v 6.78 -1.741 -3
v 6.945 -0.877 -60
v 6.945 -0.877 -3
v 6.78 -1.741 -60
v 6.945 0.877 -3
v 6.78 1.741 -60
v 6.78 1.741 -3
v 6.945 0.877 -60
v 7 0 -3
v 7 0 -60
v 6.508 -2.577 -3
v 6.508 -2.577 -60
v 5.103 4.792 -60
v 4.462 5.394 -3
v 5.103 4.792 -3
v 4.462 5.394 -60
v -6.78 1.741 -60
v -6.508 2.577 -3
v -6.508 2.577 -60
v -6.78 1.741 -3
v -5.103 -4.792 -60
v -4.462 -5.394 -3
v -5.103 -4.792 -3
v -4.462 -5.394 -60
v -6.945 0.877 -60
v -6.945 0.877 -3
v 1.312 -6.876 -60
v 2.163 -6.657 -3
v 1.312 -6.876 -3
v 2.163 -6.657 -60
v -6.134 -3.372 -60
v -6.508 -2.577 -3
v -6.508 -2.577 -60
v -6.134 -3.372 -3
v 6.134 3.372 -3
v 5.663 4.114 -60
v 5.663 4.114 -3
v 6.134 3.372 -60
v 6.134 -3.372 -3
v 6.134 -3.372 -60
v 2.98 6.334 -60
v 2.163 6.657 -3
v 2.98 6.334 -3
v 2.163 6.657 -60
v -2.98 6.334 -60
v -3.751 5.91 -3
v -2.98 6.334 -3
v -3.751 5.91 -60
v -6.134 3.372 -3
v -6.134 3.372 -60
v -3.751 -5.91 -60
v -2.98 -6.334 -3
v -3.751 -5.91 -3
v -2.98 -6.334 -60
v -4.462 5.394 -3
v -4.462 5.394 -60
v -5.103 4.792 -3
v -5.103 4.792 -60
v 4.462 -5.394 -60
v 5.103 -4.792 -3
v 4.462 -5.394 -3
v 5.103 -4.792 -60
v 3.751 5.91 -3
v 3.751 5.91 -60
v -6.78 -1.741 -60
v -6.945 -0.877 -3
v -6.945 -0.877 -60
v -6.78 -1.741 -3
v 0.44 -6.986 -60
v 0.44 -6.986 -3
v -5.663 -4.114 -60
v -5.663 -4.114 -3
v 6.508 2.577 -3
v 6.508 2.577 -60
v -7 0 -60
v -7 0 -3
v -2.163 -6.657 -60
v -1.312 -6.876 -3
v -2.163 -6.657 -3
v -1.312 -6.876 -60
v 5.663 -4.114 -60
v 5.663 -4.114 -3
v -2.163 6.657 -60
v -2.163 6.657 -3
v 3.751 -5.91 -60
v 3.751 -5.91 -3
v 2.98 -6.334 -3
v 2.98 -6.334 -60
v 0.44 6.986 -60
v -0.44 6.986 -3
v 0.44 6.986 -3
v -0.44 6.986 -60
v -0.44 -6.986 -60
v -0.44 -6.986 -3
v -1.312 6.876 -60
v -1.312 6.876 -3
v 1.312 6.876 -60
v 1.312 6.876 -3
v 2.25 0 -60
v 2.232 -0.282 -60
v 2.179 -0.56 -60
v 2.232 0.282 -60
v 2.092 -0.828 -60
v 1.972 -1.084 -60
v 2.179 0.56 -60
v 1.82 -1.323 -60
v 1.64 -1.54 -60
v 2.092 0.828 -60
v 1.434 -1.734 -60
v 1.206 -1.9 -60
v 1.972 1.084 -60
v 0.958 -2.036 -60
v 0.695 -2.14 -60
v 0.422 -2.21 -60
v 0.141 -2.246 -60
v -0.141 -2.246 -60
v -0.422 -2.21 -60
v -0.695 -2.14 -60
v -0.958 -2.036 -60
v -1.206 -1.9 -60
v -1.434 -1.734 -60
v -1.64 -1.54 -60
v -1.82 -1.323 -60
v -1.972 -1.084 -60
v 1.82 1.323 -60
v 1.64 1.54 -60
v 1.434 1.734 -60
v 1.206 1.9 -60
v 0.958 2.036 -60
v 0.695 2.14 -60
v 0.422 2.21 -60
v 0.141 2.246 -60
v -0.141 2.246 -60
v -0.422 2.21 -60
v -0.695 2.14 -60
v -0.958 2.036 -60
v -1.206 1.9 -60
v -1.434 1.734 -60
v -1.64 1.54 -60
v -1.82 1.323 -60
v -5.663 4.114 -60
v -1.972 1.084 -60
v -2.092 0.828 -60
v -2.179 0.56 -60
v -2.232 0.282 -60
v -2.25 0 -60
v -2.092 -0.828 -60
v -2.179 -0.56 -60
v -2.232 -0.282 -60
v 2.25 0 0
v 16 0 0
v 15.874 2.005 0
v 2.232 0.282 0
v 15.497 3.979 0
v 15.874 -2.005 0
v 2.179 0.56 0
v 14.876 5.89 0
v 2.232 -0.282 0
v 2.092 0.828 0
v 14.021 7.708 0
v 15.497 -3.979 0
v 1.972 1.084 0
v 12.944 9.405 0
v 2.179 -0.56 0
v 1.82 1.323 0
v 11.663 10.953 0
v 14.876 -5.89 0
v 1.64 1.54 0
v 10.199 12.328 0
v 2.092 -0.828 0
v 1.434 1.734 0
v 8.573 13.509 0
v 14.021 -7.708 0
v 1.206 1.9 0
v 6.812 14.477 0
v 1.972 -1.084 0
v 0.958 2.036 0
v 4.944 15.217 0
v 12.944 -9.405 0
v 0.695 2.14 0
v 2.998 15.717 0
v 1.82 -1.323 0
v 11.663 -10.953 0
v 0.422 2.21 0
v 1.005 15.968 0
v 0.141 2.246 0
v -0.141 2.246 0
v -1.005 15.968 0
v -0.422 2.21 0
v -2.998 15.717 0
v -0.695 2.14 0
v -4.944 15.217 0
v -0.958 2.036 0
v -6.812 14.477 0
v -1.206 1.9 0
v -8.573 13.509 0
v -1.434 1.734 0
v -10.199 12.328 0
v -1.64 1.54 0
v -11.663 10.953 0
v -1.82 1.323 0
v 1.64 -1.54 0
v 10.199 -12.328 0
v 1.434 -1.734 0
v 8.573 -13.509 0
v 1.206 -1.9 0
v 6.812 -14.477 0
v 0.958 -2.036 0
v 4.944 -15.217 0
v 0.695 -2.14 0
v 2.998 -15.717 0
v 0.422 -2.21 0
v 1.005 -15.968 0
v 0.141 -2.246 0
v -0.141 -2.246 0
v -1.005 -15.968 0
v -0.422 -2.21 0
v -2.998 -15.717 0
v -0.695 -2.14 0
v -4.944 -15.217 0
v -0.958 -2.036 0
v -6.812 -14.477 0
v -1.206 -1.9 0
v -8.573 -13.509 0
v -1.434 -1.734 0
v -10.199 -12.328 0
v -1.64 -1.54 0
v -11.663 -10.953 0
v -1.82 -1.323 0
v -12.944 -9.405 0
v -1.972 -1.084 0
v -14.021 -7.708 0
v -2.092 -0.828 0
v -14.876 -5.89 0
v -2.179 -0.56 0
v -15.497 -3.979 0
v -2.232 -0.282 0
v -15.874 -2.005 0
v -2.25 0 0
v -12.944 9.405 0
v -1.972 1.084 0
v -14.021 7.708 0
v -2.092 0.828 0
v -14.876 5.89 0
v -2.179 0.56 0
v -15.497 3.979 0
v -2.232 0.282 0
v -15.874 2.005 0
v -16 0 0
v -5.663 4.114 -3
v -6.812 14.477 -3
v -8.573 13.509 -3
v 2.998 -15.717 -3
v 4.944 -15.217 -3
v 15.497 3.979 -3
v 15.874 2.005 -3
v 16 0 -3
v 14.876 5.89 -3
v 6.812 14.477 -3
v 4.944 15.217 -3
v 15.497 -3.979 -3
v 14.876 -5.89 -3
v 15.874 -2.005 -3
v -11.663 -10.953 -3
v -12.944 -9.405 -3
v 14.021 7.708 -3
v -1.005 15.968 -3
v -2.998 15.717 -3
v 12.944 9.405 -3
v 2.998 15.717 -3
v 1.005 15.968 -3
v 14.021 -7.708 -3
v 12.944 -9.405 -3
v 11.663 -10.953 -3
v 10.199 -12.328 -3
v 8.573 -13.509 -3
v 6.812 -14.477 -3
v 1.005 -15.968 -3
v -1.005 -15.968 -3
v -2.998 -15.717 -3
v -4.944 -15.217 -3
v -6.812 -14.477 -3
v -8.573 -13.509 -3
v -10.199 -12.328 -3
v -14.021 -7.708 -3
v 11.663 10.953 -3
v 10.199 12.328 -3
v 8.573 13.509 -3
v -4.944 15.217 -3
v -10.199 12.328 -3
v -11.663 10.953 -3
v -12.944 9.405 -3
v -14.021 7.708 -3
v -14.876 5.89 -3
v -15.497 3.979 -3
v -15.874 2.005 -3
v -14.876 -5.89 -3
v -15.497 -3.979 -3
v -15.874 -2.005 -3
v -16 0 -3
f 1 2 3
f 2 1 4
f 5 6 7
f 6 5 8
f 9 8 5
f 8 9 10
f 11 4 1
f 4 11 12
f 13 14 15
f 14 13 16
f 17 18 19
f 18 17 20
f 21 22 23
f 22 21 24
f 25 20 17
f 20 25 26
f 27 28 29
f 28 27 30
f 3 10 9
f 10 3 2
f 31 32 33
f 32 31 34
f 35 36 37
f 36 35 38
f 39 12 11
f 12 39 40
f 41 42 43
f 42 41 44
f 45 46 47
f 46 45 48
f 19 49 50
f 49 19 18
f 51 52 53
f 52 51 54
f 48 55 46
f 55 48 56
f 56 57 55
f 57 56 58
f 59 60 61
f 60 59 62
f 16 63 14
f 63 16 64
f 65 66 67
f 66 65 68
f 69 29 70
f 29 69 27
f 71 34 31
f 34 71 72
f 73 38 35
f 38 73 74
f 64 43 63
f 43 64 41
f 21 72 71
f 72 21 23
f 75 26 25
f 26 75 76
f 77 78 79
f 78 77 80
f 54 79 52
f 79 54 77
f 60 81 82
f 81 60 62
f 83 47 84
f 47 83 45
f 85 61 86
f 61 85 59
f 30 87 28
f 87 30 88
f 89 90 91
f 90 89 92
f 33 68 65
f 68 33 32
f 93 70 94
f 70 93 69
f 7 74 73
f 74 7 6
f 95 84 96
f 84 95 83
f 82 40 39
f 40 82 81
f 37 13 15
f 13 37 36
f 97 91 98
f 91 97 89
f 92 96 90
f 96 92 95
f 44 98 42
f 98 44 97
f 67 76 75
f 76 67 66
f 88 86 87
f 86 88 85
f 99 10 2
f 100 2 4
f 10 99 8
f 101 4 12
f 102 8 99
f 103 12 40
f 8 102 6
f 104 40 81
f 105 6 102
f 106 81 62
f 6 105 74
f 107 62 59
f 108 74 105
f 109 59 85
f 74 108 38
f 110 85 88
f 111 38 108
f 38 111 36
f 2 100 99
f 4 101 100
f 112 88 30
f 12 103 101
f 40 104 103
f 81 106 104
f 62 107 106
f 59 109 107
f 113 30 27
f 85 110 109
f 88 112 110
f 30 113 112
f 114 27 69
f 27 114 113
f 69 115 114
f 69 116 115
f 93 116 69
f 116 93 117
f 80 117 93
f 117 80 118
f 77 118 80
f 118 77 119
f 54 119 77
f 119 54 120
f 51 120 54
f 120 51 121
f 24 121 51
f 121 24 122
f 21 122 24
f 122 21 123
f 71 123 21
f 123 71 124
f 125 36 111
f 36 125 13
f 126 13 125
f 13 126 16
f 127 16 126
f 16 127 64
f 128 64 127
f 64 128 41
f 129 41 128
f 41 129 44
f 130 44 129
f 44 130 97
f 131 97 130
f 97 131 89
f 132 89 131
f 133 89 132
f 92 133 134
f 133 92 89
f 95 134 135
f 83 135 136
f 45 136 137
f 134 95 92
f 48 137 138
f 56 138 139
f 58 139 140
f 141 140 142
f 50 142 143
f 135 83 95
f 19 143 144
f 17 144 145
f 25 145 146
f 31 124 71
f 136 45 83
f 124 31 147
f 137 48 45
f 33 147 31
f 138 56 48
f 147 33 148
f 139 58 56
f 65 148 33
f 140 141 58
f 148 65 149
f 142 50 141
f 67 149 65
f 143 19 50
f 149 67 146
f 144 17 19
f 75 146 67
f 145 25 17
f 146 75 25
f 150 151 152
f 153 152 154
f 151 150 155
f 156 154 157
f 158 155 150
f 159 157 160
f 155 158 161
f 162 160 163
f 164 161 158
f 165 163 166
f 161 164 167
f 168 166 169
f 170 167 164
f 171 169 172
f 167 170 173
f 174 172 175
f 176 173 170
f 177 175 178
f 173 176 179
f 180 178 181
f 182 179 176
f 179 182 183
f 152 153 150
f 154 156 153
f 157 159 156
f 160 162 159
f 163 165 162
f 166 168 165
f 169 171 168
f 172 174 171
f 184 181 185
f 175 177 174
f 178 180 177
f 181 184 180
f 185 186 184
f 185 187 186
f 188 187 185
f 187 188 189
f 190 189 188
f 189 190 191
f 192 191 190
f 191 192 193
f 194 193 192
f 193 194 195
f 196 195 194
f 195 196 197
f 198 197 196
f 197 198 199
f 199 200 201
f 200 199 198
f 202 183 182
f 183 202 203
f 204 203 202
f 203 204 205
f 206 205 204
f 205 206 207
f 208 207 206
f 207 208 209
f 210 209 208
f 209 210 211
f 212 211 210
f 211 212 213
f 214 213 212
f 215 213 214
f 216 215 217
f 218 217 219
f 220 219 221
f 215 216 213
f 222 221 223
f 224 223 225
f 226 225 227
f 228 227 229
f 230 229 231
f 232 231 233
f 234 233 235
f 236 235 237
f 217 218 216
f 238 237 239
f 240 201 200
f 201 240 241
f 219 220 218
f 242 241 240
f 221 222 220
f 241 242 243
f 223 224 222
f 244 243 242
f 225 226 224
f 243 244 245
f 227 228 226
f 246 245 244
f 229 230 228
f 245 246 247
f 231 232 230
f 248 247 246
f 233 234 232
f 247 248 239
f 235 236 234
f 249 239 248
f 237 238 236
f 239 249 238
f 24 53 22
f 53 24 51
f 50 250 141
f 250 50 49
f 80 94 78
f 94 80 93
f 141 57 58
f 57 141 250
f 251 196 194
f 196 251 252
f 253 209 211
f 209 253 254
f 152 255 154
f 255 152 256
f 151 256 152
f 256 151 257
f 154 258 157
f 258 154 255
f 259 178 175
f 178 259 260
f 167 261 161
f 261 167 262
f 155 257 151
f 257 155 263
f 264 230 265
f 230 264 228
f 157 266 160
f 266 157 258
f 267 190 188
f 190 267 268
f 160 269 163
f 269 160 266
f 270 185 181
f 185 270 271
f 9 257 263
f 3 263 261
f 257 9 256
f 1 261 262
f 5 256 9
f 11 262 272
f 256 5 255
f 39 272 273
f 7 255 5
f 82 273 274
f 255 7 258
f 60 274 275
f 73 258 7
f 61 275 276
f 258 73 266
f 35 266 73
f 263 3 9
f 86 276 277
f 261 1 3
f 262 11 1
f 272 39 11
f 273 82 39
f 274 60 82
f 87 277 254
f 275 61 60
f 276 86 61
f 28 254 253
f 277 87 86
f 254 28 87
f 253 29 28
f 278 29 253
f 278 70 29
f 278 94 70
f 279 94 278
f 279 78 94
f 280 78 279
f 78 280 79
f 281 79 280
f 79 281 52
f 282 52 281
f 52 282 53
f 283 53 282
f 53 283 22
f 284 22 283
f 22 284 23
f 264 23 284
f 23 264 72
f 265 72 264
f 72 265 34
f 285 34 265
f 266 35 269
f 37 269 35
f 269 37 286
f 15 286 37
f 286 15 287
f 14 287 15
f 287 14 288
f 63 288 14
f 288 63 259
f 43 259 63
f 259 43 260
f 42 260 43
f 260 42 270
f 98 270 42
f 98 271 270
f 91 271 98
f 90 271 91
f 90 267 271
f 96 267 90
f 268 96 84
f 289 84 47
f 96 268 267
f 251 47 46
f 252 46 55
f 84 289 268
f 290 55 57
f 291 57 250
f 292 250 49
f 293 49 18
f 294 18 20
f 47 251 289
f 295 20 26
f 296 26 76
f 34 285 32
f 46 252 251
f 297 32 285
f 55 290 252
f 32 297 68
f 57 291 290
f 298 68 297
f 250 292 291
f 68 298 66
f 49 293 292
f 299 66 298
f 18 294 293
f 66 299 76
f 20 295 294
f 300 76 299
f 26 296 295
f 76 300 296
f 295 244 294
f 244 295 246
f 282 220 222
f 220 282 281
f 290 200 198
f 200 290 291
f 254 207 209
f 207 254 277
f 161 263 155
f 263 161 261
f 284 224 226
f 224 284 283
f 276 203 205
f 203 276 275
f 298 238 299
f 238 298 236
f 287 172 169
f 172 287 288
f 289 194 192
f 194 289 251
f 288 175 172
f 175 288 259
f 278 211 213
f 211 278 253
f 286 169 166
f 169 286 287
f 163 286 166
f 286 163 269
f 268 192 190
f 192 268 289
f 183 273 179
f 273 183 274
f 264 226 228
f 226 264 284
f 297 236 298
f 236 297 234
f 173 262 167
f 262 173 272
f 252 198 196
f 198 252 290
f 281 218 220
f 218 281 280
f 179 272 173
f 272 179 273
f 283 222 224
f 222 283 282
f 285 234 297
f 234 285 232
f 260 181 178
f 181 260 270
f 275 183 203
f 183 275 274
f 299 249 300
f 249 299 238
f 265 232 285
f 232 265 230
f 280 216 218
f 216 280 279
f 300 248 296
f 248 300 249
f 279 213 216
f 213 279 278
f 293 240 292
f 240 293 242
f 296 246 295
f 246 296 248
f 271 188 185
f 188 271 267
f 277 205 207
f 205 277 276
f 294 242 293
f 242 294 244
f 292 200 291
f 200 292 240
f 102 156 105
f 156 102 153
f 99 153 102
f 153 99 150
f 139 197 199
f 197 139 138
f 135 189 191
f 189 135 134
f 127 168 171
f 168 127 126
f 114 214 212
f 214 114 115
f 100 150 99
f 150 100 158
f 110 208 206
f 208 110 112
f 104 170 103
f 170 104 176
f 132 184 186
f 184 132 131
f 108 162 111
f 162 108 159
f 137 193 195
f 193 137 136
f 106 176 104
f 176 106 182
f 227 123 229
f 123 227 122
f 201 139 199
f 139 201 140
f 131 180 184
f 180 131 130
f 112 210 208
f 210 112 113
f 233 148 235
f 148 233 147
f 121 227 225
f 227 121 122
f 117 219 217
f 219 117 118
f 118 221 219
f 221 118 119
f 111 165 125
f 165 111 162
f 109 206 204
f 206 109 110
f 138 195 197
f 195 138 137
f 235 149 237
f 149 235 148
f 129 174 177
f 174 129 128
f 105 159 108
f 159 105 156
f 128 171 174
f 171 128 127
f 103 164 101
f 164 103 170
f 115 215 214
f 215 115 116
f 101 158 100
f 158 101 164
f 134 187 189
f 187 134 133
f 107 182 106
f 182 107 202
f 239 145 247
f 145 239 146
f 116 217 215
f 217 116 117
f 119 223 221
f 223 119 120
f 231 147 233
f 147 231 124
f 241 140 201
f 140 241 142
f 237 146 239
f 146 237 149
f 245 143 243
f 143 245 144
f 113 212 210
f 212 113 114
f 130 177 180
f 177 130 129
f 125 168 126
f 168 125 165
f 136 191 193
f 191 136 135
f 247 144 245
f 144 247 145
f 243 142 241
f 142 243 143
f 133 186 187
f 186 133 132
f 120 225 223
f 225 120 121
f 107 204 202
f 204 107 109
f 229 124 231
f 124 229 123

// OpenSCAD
$fn = 50;


difference() {
	union() {
		translate(v = [0, 0, -60.0000000000]) {
			cylinder(h = 60, r = 7.0000000000);
		}
		translate(v = [0, 0, -3.0000000000]) {
			cylinder(h = 3, r = 16.0000000000);
		}
	}
	union() {
		#translate(v = [0, 0, -60]) {
			cylinder(h = 60, r = 2.2500000000);
		}
	}
}
